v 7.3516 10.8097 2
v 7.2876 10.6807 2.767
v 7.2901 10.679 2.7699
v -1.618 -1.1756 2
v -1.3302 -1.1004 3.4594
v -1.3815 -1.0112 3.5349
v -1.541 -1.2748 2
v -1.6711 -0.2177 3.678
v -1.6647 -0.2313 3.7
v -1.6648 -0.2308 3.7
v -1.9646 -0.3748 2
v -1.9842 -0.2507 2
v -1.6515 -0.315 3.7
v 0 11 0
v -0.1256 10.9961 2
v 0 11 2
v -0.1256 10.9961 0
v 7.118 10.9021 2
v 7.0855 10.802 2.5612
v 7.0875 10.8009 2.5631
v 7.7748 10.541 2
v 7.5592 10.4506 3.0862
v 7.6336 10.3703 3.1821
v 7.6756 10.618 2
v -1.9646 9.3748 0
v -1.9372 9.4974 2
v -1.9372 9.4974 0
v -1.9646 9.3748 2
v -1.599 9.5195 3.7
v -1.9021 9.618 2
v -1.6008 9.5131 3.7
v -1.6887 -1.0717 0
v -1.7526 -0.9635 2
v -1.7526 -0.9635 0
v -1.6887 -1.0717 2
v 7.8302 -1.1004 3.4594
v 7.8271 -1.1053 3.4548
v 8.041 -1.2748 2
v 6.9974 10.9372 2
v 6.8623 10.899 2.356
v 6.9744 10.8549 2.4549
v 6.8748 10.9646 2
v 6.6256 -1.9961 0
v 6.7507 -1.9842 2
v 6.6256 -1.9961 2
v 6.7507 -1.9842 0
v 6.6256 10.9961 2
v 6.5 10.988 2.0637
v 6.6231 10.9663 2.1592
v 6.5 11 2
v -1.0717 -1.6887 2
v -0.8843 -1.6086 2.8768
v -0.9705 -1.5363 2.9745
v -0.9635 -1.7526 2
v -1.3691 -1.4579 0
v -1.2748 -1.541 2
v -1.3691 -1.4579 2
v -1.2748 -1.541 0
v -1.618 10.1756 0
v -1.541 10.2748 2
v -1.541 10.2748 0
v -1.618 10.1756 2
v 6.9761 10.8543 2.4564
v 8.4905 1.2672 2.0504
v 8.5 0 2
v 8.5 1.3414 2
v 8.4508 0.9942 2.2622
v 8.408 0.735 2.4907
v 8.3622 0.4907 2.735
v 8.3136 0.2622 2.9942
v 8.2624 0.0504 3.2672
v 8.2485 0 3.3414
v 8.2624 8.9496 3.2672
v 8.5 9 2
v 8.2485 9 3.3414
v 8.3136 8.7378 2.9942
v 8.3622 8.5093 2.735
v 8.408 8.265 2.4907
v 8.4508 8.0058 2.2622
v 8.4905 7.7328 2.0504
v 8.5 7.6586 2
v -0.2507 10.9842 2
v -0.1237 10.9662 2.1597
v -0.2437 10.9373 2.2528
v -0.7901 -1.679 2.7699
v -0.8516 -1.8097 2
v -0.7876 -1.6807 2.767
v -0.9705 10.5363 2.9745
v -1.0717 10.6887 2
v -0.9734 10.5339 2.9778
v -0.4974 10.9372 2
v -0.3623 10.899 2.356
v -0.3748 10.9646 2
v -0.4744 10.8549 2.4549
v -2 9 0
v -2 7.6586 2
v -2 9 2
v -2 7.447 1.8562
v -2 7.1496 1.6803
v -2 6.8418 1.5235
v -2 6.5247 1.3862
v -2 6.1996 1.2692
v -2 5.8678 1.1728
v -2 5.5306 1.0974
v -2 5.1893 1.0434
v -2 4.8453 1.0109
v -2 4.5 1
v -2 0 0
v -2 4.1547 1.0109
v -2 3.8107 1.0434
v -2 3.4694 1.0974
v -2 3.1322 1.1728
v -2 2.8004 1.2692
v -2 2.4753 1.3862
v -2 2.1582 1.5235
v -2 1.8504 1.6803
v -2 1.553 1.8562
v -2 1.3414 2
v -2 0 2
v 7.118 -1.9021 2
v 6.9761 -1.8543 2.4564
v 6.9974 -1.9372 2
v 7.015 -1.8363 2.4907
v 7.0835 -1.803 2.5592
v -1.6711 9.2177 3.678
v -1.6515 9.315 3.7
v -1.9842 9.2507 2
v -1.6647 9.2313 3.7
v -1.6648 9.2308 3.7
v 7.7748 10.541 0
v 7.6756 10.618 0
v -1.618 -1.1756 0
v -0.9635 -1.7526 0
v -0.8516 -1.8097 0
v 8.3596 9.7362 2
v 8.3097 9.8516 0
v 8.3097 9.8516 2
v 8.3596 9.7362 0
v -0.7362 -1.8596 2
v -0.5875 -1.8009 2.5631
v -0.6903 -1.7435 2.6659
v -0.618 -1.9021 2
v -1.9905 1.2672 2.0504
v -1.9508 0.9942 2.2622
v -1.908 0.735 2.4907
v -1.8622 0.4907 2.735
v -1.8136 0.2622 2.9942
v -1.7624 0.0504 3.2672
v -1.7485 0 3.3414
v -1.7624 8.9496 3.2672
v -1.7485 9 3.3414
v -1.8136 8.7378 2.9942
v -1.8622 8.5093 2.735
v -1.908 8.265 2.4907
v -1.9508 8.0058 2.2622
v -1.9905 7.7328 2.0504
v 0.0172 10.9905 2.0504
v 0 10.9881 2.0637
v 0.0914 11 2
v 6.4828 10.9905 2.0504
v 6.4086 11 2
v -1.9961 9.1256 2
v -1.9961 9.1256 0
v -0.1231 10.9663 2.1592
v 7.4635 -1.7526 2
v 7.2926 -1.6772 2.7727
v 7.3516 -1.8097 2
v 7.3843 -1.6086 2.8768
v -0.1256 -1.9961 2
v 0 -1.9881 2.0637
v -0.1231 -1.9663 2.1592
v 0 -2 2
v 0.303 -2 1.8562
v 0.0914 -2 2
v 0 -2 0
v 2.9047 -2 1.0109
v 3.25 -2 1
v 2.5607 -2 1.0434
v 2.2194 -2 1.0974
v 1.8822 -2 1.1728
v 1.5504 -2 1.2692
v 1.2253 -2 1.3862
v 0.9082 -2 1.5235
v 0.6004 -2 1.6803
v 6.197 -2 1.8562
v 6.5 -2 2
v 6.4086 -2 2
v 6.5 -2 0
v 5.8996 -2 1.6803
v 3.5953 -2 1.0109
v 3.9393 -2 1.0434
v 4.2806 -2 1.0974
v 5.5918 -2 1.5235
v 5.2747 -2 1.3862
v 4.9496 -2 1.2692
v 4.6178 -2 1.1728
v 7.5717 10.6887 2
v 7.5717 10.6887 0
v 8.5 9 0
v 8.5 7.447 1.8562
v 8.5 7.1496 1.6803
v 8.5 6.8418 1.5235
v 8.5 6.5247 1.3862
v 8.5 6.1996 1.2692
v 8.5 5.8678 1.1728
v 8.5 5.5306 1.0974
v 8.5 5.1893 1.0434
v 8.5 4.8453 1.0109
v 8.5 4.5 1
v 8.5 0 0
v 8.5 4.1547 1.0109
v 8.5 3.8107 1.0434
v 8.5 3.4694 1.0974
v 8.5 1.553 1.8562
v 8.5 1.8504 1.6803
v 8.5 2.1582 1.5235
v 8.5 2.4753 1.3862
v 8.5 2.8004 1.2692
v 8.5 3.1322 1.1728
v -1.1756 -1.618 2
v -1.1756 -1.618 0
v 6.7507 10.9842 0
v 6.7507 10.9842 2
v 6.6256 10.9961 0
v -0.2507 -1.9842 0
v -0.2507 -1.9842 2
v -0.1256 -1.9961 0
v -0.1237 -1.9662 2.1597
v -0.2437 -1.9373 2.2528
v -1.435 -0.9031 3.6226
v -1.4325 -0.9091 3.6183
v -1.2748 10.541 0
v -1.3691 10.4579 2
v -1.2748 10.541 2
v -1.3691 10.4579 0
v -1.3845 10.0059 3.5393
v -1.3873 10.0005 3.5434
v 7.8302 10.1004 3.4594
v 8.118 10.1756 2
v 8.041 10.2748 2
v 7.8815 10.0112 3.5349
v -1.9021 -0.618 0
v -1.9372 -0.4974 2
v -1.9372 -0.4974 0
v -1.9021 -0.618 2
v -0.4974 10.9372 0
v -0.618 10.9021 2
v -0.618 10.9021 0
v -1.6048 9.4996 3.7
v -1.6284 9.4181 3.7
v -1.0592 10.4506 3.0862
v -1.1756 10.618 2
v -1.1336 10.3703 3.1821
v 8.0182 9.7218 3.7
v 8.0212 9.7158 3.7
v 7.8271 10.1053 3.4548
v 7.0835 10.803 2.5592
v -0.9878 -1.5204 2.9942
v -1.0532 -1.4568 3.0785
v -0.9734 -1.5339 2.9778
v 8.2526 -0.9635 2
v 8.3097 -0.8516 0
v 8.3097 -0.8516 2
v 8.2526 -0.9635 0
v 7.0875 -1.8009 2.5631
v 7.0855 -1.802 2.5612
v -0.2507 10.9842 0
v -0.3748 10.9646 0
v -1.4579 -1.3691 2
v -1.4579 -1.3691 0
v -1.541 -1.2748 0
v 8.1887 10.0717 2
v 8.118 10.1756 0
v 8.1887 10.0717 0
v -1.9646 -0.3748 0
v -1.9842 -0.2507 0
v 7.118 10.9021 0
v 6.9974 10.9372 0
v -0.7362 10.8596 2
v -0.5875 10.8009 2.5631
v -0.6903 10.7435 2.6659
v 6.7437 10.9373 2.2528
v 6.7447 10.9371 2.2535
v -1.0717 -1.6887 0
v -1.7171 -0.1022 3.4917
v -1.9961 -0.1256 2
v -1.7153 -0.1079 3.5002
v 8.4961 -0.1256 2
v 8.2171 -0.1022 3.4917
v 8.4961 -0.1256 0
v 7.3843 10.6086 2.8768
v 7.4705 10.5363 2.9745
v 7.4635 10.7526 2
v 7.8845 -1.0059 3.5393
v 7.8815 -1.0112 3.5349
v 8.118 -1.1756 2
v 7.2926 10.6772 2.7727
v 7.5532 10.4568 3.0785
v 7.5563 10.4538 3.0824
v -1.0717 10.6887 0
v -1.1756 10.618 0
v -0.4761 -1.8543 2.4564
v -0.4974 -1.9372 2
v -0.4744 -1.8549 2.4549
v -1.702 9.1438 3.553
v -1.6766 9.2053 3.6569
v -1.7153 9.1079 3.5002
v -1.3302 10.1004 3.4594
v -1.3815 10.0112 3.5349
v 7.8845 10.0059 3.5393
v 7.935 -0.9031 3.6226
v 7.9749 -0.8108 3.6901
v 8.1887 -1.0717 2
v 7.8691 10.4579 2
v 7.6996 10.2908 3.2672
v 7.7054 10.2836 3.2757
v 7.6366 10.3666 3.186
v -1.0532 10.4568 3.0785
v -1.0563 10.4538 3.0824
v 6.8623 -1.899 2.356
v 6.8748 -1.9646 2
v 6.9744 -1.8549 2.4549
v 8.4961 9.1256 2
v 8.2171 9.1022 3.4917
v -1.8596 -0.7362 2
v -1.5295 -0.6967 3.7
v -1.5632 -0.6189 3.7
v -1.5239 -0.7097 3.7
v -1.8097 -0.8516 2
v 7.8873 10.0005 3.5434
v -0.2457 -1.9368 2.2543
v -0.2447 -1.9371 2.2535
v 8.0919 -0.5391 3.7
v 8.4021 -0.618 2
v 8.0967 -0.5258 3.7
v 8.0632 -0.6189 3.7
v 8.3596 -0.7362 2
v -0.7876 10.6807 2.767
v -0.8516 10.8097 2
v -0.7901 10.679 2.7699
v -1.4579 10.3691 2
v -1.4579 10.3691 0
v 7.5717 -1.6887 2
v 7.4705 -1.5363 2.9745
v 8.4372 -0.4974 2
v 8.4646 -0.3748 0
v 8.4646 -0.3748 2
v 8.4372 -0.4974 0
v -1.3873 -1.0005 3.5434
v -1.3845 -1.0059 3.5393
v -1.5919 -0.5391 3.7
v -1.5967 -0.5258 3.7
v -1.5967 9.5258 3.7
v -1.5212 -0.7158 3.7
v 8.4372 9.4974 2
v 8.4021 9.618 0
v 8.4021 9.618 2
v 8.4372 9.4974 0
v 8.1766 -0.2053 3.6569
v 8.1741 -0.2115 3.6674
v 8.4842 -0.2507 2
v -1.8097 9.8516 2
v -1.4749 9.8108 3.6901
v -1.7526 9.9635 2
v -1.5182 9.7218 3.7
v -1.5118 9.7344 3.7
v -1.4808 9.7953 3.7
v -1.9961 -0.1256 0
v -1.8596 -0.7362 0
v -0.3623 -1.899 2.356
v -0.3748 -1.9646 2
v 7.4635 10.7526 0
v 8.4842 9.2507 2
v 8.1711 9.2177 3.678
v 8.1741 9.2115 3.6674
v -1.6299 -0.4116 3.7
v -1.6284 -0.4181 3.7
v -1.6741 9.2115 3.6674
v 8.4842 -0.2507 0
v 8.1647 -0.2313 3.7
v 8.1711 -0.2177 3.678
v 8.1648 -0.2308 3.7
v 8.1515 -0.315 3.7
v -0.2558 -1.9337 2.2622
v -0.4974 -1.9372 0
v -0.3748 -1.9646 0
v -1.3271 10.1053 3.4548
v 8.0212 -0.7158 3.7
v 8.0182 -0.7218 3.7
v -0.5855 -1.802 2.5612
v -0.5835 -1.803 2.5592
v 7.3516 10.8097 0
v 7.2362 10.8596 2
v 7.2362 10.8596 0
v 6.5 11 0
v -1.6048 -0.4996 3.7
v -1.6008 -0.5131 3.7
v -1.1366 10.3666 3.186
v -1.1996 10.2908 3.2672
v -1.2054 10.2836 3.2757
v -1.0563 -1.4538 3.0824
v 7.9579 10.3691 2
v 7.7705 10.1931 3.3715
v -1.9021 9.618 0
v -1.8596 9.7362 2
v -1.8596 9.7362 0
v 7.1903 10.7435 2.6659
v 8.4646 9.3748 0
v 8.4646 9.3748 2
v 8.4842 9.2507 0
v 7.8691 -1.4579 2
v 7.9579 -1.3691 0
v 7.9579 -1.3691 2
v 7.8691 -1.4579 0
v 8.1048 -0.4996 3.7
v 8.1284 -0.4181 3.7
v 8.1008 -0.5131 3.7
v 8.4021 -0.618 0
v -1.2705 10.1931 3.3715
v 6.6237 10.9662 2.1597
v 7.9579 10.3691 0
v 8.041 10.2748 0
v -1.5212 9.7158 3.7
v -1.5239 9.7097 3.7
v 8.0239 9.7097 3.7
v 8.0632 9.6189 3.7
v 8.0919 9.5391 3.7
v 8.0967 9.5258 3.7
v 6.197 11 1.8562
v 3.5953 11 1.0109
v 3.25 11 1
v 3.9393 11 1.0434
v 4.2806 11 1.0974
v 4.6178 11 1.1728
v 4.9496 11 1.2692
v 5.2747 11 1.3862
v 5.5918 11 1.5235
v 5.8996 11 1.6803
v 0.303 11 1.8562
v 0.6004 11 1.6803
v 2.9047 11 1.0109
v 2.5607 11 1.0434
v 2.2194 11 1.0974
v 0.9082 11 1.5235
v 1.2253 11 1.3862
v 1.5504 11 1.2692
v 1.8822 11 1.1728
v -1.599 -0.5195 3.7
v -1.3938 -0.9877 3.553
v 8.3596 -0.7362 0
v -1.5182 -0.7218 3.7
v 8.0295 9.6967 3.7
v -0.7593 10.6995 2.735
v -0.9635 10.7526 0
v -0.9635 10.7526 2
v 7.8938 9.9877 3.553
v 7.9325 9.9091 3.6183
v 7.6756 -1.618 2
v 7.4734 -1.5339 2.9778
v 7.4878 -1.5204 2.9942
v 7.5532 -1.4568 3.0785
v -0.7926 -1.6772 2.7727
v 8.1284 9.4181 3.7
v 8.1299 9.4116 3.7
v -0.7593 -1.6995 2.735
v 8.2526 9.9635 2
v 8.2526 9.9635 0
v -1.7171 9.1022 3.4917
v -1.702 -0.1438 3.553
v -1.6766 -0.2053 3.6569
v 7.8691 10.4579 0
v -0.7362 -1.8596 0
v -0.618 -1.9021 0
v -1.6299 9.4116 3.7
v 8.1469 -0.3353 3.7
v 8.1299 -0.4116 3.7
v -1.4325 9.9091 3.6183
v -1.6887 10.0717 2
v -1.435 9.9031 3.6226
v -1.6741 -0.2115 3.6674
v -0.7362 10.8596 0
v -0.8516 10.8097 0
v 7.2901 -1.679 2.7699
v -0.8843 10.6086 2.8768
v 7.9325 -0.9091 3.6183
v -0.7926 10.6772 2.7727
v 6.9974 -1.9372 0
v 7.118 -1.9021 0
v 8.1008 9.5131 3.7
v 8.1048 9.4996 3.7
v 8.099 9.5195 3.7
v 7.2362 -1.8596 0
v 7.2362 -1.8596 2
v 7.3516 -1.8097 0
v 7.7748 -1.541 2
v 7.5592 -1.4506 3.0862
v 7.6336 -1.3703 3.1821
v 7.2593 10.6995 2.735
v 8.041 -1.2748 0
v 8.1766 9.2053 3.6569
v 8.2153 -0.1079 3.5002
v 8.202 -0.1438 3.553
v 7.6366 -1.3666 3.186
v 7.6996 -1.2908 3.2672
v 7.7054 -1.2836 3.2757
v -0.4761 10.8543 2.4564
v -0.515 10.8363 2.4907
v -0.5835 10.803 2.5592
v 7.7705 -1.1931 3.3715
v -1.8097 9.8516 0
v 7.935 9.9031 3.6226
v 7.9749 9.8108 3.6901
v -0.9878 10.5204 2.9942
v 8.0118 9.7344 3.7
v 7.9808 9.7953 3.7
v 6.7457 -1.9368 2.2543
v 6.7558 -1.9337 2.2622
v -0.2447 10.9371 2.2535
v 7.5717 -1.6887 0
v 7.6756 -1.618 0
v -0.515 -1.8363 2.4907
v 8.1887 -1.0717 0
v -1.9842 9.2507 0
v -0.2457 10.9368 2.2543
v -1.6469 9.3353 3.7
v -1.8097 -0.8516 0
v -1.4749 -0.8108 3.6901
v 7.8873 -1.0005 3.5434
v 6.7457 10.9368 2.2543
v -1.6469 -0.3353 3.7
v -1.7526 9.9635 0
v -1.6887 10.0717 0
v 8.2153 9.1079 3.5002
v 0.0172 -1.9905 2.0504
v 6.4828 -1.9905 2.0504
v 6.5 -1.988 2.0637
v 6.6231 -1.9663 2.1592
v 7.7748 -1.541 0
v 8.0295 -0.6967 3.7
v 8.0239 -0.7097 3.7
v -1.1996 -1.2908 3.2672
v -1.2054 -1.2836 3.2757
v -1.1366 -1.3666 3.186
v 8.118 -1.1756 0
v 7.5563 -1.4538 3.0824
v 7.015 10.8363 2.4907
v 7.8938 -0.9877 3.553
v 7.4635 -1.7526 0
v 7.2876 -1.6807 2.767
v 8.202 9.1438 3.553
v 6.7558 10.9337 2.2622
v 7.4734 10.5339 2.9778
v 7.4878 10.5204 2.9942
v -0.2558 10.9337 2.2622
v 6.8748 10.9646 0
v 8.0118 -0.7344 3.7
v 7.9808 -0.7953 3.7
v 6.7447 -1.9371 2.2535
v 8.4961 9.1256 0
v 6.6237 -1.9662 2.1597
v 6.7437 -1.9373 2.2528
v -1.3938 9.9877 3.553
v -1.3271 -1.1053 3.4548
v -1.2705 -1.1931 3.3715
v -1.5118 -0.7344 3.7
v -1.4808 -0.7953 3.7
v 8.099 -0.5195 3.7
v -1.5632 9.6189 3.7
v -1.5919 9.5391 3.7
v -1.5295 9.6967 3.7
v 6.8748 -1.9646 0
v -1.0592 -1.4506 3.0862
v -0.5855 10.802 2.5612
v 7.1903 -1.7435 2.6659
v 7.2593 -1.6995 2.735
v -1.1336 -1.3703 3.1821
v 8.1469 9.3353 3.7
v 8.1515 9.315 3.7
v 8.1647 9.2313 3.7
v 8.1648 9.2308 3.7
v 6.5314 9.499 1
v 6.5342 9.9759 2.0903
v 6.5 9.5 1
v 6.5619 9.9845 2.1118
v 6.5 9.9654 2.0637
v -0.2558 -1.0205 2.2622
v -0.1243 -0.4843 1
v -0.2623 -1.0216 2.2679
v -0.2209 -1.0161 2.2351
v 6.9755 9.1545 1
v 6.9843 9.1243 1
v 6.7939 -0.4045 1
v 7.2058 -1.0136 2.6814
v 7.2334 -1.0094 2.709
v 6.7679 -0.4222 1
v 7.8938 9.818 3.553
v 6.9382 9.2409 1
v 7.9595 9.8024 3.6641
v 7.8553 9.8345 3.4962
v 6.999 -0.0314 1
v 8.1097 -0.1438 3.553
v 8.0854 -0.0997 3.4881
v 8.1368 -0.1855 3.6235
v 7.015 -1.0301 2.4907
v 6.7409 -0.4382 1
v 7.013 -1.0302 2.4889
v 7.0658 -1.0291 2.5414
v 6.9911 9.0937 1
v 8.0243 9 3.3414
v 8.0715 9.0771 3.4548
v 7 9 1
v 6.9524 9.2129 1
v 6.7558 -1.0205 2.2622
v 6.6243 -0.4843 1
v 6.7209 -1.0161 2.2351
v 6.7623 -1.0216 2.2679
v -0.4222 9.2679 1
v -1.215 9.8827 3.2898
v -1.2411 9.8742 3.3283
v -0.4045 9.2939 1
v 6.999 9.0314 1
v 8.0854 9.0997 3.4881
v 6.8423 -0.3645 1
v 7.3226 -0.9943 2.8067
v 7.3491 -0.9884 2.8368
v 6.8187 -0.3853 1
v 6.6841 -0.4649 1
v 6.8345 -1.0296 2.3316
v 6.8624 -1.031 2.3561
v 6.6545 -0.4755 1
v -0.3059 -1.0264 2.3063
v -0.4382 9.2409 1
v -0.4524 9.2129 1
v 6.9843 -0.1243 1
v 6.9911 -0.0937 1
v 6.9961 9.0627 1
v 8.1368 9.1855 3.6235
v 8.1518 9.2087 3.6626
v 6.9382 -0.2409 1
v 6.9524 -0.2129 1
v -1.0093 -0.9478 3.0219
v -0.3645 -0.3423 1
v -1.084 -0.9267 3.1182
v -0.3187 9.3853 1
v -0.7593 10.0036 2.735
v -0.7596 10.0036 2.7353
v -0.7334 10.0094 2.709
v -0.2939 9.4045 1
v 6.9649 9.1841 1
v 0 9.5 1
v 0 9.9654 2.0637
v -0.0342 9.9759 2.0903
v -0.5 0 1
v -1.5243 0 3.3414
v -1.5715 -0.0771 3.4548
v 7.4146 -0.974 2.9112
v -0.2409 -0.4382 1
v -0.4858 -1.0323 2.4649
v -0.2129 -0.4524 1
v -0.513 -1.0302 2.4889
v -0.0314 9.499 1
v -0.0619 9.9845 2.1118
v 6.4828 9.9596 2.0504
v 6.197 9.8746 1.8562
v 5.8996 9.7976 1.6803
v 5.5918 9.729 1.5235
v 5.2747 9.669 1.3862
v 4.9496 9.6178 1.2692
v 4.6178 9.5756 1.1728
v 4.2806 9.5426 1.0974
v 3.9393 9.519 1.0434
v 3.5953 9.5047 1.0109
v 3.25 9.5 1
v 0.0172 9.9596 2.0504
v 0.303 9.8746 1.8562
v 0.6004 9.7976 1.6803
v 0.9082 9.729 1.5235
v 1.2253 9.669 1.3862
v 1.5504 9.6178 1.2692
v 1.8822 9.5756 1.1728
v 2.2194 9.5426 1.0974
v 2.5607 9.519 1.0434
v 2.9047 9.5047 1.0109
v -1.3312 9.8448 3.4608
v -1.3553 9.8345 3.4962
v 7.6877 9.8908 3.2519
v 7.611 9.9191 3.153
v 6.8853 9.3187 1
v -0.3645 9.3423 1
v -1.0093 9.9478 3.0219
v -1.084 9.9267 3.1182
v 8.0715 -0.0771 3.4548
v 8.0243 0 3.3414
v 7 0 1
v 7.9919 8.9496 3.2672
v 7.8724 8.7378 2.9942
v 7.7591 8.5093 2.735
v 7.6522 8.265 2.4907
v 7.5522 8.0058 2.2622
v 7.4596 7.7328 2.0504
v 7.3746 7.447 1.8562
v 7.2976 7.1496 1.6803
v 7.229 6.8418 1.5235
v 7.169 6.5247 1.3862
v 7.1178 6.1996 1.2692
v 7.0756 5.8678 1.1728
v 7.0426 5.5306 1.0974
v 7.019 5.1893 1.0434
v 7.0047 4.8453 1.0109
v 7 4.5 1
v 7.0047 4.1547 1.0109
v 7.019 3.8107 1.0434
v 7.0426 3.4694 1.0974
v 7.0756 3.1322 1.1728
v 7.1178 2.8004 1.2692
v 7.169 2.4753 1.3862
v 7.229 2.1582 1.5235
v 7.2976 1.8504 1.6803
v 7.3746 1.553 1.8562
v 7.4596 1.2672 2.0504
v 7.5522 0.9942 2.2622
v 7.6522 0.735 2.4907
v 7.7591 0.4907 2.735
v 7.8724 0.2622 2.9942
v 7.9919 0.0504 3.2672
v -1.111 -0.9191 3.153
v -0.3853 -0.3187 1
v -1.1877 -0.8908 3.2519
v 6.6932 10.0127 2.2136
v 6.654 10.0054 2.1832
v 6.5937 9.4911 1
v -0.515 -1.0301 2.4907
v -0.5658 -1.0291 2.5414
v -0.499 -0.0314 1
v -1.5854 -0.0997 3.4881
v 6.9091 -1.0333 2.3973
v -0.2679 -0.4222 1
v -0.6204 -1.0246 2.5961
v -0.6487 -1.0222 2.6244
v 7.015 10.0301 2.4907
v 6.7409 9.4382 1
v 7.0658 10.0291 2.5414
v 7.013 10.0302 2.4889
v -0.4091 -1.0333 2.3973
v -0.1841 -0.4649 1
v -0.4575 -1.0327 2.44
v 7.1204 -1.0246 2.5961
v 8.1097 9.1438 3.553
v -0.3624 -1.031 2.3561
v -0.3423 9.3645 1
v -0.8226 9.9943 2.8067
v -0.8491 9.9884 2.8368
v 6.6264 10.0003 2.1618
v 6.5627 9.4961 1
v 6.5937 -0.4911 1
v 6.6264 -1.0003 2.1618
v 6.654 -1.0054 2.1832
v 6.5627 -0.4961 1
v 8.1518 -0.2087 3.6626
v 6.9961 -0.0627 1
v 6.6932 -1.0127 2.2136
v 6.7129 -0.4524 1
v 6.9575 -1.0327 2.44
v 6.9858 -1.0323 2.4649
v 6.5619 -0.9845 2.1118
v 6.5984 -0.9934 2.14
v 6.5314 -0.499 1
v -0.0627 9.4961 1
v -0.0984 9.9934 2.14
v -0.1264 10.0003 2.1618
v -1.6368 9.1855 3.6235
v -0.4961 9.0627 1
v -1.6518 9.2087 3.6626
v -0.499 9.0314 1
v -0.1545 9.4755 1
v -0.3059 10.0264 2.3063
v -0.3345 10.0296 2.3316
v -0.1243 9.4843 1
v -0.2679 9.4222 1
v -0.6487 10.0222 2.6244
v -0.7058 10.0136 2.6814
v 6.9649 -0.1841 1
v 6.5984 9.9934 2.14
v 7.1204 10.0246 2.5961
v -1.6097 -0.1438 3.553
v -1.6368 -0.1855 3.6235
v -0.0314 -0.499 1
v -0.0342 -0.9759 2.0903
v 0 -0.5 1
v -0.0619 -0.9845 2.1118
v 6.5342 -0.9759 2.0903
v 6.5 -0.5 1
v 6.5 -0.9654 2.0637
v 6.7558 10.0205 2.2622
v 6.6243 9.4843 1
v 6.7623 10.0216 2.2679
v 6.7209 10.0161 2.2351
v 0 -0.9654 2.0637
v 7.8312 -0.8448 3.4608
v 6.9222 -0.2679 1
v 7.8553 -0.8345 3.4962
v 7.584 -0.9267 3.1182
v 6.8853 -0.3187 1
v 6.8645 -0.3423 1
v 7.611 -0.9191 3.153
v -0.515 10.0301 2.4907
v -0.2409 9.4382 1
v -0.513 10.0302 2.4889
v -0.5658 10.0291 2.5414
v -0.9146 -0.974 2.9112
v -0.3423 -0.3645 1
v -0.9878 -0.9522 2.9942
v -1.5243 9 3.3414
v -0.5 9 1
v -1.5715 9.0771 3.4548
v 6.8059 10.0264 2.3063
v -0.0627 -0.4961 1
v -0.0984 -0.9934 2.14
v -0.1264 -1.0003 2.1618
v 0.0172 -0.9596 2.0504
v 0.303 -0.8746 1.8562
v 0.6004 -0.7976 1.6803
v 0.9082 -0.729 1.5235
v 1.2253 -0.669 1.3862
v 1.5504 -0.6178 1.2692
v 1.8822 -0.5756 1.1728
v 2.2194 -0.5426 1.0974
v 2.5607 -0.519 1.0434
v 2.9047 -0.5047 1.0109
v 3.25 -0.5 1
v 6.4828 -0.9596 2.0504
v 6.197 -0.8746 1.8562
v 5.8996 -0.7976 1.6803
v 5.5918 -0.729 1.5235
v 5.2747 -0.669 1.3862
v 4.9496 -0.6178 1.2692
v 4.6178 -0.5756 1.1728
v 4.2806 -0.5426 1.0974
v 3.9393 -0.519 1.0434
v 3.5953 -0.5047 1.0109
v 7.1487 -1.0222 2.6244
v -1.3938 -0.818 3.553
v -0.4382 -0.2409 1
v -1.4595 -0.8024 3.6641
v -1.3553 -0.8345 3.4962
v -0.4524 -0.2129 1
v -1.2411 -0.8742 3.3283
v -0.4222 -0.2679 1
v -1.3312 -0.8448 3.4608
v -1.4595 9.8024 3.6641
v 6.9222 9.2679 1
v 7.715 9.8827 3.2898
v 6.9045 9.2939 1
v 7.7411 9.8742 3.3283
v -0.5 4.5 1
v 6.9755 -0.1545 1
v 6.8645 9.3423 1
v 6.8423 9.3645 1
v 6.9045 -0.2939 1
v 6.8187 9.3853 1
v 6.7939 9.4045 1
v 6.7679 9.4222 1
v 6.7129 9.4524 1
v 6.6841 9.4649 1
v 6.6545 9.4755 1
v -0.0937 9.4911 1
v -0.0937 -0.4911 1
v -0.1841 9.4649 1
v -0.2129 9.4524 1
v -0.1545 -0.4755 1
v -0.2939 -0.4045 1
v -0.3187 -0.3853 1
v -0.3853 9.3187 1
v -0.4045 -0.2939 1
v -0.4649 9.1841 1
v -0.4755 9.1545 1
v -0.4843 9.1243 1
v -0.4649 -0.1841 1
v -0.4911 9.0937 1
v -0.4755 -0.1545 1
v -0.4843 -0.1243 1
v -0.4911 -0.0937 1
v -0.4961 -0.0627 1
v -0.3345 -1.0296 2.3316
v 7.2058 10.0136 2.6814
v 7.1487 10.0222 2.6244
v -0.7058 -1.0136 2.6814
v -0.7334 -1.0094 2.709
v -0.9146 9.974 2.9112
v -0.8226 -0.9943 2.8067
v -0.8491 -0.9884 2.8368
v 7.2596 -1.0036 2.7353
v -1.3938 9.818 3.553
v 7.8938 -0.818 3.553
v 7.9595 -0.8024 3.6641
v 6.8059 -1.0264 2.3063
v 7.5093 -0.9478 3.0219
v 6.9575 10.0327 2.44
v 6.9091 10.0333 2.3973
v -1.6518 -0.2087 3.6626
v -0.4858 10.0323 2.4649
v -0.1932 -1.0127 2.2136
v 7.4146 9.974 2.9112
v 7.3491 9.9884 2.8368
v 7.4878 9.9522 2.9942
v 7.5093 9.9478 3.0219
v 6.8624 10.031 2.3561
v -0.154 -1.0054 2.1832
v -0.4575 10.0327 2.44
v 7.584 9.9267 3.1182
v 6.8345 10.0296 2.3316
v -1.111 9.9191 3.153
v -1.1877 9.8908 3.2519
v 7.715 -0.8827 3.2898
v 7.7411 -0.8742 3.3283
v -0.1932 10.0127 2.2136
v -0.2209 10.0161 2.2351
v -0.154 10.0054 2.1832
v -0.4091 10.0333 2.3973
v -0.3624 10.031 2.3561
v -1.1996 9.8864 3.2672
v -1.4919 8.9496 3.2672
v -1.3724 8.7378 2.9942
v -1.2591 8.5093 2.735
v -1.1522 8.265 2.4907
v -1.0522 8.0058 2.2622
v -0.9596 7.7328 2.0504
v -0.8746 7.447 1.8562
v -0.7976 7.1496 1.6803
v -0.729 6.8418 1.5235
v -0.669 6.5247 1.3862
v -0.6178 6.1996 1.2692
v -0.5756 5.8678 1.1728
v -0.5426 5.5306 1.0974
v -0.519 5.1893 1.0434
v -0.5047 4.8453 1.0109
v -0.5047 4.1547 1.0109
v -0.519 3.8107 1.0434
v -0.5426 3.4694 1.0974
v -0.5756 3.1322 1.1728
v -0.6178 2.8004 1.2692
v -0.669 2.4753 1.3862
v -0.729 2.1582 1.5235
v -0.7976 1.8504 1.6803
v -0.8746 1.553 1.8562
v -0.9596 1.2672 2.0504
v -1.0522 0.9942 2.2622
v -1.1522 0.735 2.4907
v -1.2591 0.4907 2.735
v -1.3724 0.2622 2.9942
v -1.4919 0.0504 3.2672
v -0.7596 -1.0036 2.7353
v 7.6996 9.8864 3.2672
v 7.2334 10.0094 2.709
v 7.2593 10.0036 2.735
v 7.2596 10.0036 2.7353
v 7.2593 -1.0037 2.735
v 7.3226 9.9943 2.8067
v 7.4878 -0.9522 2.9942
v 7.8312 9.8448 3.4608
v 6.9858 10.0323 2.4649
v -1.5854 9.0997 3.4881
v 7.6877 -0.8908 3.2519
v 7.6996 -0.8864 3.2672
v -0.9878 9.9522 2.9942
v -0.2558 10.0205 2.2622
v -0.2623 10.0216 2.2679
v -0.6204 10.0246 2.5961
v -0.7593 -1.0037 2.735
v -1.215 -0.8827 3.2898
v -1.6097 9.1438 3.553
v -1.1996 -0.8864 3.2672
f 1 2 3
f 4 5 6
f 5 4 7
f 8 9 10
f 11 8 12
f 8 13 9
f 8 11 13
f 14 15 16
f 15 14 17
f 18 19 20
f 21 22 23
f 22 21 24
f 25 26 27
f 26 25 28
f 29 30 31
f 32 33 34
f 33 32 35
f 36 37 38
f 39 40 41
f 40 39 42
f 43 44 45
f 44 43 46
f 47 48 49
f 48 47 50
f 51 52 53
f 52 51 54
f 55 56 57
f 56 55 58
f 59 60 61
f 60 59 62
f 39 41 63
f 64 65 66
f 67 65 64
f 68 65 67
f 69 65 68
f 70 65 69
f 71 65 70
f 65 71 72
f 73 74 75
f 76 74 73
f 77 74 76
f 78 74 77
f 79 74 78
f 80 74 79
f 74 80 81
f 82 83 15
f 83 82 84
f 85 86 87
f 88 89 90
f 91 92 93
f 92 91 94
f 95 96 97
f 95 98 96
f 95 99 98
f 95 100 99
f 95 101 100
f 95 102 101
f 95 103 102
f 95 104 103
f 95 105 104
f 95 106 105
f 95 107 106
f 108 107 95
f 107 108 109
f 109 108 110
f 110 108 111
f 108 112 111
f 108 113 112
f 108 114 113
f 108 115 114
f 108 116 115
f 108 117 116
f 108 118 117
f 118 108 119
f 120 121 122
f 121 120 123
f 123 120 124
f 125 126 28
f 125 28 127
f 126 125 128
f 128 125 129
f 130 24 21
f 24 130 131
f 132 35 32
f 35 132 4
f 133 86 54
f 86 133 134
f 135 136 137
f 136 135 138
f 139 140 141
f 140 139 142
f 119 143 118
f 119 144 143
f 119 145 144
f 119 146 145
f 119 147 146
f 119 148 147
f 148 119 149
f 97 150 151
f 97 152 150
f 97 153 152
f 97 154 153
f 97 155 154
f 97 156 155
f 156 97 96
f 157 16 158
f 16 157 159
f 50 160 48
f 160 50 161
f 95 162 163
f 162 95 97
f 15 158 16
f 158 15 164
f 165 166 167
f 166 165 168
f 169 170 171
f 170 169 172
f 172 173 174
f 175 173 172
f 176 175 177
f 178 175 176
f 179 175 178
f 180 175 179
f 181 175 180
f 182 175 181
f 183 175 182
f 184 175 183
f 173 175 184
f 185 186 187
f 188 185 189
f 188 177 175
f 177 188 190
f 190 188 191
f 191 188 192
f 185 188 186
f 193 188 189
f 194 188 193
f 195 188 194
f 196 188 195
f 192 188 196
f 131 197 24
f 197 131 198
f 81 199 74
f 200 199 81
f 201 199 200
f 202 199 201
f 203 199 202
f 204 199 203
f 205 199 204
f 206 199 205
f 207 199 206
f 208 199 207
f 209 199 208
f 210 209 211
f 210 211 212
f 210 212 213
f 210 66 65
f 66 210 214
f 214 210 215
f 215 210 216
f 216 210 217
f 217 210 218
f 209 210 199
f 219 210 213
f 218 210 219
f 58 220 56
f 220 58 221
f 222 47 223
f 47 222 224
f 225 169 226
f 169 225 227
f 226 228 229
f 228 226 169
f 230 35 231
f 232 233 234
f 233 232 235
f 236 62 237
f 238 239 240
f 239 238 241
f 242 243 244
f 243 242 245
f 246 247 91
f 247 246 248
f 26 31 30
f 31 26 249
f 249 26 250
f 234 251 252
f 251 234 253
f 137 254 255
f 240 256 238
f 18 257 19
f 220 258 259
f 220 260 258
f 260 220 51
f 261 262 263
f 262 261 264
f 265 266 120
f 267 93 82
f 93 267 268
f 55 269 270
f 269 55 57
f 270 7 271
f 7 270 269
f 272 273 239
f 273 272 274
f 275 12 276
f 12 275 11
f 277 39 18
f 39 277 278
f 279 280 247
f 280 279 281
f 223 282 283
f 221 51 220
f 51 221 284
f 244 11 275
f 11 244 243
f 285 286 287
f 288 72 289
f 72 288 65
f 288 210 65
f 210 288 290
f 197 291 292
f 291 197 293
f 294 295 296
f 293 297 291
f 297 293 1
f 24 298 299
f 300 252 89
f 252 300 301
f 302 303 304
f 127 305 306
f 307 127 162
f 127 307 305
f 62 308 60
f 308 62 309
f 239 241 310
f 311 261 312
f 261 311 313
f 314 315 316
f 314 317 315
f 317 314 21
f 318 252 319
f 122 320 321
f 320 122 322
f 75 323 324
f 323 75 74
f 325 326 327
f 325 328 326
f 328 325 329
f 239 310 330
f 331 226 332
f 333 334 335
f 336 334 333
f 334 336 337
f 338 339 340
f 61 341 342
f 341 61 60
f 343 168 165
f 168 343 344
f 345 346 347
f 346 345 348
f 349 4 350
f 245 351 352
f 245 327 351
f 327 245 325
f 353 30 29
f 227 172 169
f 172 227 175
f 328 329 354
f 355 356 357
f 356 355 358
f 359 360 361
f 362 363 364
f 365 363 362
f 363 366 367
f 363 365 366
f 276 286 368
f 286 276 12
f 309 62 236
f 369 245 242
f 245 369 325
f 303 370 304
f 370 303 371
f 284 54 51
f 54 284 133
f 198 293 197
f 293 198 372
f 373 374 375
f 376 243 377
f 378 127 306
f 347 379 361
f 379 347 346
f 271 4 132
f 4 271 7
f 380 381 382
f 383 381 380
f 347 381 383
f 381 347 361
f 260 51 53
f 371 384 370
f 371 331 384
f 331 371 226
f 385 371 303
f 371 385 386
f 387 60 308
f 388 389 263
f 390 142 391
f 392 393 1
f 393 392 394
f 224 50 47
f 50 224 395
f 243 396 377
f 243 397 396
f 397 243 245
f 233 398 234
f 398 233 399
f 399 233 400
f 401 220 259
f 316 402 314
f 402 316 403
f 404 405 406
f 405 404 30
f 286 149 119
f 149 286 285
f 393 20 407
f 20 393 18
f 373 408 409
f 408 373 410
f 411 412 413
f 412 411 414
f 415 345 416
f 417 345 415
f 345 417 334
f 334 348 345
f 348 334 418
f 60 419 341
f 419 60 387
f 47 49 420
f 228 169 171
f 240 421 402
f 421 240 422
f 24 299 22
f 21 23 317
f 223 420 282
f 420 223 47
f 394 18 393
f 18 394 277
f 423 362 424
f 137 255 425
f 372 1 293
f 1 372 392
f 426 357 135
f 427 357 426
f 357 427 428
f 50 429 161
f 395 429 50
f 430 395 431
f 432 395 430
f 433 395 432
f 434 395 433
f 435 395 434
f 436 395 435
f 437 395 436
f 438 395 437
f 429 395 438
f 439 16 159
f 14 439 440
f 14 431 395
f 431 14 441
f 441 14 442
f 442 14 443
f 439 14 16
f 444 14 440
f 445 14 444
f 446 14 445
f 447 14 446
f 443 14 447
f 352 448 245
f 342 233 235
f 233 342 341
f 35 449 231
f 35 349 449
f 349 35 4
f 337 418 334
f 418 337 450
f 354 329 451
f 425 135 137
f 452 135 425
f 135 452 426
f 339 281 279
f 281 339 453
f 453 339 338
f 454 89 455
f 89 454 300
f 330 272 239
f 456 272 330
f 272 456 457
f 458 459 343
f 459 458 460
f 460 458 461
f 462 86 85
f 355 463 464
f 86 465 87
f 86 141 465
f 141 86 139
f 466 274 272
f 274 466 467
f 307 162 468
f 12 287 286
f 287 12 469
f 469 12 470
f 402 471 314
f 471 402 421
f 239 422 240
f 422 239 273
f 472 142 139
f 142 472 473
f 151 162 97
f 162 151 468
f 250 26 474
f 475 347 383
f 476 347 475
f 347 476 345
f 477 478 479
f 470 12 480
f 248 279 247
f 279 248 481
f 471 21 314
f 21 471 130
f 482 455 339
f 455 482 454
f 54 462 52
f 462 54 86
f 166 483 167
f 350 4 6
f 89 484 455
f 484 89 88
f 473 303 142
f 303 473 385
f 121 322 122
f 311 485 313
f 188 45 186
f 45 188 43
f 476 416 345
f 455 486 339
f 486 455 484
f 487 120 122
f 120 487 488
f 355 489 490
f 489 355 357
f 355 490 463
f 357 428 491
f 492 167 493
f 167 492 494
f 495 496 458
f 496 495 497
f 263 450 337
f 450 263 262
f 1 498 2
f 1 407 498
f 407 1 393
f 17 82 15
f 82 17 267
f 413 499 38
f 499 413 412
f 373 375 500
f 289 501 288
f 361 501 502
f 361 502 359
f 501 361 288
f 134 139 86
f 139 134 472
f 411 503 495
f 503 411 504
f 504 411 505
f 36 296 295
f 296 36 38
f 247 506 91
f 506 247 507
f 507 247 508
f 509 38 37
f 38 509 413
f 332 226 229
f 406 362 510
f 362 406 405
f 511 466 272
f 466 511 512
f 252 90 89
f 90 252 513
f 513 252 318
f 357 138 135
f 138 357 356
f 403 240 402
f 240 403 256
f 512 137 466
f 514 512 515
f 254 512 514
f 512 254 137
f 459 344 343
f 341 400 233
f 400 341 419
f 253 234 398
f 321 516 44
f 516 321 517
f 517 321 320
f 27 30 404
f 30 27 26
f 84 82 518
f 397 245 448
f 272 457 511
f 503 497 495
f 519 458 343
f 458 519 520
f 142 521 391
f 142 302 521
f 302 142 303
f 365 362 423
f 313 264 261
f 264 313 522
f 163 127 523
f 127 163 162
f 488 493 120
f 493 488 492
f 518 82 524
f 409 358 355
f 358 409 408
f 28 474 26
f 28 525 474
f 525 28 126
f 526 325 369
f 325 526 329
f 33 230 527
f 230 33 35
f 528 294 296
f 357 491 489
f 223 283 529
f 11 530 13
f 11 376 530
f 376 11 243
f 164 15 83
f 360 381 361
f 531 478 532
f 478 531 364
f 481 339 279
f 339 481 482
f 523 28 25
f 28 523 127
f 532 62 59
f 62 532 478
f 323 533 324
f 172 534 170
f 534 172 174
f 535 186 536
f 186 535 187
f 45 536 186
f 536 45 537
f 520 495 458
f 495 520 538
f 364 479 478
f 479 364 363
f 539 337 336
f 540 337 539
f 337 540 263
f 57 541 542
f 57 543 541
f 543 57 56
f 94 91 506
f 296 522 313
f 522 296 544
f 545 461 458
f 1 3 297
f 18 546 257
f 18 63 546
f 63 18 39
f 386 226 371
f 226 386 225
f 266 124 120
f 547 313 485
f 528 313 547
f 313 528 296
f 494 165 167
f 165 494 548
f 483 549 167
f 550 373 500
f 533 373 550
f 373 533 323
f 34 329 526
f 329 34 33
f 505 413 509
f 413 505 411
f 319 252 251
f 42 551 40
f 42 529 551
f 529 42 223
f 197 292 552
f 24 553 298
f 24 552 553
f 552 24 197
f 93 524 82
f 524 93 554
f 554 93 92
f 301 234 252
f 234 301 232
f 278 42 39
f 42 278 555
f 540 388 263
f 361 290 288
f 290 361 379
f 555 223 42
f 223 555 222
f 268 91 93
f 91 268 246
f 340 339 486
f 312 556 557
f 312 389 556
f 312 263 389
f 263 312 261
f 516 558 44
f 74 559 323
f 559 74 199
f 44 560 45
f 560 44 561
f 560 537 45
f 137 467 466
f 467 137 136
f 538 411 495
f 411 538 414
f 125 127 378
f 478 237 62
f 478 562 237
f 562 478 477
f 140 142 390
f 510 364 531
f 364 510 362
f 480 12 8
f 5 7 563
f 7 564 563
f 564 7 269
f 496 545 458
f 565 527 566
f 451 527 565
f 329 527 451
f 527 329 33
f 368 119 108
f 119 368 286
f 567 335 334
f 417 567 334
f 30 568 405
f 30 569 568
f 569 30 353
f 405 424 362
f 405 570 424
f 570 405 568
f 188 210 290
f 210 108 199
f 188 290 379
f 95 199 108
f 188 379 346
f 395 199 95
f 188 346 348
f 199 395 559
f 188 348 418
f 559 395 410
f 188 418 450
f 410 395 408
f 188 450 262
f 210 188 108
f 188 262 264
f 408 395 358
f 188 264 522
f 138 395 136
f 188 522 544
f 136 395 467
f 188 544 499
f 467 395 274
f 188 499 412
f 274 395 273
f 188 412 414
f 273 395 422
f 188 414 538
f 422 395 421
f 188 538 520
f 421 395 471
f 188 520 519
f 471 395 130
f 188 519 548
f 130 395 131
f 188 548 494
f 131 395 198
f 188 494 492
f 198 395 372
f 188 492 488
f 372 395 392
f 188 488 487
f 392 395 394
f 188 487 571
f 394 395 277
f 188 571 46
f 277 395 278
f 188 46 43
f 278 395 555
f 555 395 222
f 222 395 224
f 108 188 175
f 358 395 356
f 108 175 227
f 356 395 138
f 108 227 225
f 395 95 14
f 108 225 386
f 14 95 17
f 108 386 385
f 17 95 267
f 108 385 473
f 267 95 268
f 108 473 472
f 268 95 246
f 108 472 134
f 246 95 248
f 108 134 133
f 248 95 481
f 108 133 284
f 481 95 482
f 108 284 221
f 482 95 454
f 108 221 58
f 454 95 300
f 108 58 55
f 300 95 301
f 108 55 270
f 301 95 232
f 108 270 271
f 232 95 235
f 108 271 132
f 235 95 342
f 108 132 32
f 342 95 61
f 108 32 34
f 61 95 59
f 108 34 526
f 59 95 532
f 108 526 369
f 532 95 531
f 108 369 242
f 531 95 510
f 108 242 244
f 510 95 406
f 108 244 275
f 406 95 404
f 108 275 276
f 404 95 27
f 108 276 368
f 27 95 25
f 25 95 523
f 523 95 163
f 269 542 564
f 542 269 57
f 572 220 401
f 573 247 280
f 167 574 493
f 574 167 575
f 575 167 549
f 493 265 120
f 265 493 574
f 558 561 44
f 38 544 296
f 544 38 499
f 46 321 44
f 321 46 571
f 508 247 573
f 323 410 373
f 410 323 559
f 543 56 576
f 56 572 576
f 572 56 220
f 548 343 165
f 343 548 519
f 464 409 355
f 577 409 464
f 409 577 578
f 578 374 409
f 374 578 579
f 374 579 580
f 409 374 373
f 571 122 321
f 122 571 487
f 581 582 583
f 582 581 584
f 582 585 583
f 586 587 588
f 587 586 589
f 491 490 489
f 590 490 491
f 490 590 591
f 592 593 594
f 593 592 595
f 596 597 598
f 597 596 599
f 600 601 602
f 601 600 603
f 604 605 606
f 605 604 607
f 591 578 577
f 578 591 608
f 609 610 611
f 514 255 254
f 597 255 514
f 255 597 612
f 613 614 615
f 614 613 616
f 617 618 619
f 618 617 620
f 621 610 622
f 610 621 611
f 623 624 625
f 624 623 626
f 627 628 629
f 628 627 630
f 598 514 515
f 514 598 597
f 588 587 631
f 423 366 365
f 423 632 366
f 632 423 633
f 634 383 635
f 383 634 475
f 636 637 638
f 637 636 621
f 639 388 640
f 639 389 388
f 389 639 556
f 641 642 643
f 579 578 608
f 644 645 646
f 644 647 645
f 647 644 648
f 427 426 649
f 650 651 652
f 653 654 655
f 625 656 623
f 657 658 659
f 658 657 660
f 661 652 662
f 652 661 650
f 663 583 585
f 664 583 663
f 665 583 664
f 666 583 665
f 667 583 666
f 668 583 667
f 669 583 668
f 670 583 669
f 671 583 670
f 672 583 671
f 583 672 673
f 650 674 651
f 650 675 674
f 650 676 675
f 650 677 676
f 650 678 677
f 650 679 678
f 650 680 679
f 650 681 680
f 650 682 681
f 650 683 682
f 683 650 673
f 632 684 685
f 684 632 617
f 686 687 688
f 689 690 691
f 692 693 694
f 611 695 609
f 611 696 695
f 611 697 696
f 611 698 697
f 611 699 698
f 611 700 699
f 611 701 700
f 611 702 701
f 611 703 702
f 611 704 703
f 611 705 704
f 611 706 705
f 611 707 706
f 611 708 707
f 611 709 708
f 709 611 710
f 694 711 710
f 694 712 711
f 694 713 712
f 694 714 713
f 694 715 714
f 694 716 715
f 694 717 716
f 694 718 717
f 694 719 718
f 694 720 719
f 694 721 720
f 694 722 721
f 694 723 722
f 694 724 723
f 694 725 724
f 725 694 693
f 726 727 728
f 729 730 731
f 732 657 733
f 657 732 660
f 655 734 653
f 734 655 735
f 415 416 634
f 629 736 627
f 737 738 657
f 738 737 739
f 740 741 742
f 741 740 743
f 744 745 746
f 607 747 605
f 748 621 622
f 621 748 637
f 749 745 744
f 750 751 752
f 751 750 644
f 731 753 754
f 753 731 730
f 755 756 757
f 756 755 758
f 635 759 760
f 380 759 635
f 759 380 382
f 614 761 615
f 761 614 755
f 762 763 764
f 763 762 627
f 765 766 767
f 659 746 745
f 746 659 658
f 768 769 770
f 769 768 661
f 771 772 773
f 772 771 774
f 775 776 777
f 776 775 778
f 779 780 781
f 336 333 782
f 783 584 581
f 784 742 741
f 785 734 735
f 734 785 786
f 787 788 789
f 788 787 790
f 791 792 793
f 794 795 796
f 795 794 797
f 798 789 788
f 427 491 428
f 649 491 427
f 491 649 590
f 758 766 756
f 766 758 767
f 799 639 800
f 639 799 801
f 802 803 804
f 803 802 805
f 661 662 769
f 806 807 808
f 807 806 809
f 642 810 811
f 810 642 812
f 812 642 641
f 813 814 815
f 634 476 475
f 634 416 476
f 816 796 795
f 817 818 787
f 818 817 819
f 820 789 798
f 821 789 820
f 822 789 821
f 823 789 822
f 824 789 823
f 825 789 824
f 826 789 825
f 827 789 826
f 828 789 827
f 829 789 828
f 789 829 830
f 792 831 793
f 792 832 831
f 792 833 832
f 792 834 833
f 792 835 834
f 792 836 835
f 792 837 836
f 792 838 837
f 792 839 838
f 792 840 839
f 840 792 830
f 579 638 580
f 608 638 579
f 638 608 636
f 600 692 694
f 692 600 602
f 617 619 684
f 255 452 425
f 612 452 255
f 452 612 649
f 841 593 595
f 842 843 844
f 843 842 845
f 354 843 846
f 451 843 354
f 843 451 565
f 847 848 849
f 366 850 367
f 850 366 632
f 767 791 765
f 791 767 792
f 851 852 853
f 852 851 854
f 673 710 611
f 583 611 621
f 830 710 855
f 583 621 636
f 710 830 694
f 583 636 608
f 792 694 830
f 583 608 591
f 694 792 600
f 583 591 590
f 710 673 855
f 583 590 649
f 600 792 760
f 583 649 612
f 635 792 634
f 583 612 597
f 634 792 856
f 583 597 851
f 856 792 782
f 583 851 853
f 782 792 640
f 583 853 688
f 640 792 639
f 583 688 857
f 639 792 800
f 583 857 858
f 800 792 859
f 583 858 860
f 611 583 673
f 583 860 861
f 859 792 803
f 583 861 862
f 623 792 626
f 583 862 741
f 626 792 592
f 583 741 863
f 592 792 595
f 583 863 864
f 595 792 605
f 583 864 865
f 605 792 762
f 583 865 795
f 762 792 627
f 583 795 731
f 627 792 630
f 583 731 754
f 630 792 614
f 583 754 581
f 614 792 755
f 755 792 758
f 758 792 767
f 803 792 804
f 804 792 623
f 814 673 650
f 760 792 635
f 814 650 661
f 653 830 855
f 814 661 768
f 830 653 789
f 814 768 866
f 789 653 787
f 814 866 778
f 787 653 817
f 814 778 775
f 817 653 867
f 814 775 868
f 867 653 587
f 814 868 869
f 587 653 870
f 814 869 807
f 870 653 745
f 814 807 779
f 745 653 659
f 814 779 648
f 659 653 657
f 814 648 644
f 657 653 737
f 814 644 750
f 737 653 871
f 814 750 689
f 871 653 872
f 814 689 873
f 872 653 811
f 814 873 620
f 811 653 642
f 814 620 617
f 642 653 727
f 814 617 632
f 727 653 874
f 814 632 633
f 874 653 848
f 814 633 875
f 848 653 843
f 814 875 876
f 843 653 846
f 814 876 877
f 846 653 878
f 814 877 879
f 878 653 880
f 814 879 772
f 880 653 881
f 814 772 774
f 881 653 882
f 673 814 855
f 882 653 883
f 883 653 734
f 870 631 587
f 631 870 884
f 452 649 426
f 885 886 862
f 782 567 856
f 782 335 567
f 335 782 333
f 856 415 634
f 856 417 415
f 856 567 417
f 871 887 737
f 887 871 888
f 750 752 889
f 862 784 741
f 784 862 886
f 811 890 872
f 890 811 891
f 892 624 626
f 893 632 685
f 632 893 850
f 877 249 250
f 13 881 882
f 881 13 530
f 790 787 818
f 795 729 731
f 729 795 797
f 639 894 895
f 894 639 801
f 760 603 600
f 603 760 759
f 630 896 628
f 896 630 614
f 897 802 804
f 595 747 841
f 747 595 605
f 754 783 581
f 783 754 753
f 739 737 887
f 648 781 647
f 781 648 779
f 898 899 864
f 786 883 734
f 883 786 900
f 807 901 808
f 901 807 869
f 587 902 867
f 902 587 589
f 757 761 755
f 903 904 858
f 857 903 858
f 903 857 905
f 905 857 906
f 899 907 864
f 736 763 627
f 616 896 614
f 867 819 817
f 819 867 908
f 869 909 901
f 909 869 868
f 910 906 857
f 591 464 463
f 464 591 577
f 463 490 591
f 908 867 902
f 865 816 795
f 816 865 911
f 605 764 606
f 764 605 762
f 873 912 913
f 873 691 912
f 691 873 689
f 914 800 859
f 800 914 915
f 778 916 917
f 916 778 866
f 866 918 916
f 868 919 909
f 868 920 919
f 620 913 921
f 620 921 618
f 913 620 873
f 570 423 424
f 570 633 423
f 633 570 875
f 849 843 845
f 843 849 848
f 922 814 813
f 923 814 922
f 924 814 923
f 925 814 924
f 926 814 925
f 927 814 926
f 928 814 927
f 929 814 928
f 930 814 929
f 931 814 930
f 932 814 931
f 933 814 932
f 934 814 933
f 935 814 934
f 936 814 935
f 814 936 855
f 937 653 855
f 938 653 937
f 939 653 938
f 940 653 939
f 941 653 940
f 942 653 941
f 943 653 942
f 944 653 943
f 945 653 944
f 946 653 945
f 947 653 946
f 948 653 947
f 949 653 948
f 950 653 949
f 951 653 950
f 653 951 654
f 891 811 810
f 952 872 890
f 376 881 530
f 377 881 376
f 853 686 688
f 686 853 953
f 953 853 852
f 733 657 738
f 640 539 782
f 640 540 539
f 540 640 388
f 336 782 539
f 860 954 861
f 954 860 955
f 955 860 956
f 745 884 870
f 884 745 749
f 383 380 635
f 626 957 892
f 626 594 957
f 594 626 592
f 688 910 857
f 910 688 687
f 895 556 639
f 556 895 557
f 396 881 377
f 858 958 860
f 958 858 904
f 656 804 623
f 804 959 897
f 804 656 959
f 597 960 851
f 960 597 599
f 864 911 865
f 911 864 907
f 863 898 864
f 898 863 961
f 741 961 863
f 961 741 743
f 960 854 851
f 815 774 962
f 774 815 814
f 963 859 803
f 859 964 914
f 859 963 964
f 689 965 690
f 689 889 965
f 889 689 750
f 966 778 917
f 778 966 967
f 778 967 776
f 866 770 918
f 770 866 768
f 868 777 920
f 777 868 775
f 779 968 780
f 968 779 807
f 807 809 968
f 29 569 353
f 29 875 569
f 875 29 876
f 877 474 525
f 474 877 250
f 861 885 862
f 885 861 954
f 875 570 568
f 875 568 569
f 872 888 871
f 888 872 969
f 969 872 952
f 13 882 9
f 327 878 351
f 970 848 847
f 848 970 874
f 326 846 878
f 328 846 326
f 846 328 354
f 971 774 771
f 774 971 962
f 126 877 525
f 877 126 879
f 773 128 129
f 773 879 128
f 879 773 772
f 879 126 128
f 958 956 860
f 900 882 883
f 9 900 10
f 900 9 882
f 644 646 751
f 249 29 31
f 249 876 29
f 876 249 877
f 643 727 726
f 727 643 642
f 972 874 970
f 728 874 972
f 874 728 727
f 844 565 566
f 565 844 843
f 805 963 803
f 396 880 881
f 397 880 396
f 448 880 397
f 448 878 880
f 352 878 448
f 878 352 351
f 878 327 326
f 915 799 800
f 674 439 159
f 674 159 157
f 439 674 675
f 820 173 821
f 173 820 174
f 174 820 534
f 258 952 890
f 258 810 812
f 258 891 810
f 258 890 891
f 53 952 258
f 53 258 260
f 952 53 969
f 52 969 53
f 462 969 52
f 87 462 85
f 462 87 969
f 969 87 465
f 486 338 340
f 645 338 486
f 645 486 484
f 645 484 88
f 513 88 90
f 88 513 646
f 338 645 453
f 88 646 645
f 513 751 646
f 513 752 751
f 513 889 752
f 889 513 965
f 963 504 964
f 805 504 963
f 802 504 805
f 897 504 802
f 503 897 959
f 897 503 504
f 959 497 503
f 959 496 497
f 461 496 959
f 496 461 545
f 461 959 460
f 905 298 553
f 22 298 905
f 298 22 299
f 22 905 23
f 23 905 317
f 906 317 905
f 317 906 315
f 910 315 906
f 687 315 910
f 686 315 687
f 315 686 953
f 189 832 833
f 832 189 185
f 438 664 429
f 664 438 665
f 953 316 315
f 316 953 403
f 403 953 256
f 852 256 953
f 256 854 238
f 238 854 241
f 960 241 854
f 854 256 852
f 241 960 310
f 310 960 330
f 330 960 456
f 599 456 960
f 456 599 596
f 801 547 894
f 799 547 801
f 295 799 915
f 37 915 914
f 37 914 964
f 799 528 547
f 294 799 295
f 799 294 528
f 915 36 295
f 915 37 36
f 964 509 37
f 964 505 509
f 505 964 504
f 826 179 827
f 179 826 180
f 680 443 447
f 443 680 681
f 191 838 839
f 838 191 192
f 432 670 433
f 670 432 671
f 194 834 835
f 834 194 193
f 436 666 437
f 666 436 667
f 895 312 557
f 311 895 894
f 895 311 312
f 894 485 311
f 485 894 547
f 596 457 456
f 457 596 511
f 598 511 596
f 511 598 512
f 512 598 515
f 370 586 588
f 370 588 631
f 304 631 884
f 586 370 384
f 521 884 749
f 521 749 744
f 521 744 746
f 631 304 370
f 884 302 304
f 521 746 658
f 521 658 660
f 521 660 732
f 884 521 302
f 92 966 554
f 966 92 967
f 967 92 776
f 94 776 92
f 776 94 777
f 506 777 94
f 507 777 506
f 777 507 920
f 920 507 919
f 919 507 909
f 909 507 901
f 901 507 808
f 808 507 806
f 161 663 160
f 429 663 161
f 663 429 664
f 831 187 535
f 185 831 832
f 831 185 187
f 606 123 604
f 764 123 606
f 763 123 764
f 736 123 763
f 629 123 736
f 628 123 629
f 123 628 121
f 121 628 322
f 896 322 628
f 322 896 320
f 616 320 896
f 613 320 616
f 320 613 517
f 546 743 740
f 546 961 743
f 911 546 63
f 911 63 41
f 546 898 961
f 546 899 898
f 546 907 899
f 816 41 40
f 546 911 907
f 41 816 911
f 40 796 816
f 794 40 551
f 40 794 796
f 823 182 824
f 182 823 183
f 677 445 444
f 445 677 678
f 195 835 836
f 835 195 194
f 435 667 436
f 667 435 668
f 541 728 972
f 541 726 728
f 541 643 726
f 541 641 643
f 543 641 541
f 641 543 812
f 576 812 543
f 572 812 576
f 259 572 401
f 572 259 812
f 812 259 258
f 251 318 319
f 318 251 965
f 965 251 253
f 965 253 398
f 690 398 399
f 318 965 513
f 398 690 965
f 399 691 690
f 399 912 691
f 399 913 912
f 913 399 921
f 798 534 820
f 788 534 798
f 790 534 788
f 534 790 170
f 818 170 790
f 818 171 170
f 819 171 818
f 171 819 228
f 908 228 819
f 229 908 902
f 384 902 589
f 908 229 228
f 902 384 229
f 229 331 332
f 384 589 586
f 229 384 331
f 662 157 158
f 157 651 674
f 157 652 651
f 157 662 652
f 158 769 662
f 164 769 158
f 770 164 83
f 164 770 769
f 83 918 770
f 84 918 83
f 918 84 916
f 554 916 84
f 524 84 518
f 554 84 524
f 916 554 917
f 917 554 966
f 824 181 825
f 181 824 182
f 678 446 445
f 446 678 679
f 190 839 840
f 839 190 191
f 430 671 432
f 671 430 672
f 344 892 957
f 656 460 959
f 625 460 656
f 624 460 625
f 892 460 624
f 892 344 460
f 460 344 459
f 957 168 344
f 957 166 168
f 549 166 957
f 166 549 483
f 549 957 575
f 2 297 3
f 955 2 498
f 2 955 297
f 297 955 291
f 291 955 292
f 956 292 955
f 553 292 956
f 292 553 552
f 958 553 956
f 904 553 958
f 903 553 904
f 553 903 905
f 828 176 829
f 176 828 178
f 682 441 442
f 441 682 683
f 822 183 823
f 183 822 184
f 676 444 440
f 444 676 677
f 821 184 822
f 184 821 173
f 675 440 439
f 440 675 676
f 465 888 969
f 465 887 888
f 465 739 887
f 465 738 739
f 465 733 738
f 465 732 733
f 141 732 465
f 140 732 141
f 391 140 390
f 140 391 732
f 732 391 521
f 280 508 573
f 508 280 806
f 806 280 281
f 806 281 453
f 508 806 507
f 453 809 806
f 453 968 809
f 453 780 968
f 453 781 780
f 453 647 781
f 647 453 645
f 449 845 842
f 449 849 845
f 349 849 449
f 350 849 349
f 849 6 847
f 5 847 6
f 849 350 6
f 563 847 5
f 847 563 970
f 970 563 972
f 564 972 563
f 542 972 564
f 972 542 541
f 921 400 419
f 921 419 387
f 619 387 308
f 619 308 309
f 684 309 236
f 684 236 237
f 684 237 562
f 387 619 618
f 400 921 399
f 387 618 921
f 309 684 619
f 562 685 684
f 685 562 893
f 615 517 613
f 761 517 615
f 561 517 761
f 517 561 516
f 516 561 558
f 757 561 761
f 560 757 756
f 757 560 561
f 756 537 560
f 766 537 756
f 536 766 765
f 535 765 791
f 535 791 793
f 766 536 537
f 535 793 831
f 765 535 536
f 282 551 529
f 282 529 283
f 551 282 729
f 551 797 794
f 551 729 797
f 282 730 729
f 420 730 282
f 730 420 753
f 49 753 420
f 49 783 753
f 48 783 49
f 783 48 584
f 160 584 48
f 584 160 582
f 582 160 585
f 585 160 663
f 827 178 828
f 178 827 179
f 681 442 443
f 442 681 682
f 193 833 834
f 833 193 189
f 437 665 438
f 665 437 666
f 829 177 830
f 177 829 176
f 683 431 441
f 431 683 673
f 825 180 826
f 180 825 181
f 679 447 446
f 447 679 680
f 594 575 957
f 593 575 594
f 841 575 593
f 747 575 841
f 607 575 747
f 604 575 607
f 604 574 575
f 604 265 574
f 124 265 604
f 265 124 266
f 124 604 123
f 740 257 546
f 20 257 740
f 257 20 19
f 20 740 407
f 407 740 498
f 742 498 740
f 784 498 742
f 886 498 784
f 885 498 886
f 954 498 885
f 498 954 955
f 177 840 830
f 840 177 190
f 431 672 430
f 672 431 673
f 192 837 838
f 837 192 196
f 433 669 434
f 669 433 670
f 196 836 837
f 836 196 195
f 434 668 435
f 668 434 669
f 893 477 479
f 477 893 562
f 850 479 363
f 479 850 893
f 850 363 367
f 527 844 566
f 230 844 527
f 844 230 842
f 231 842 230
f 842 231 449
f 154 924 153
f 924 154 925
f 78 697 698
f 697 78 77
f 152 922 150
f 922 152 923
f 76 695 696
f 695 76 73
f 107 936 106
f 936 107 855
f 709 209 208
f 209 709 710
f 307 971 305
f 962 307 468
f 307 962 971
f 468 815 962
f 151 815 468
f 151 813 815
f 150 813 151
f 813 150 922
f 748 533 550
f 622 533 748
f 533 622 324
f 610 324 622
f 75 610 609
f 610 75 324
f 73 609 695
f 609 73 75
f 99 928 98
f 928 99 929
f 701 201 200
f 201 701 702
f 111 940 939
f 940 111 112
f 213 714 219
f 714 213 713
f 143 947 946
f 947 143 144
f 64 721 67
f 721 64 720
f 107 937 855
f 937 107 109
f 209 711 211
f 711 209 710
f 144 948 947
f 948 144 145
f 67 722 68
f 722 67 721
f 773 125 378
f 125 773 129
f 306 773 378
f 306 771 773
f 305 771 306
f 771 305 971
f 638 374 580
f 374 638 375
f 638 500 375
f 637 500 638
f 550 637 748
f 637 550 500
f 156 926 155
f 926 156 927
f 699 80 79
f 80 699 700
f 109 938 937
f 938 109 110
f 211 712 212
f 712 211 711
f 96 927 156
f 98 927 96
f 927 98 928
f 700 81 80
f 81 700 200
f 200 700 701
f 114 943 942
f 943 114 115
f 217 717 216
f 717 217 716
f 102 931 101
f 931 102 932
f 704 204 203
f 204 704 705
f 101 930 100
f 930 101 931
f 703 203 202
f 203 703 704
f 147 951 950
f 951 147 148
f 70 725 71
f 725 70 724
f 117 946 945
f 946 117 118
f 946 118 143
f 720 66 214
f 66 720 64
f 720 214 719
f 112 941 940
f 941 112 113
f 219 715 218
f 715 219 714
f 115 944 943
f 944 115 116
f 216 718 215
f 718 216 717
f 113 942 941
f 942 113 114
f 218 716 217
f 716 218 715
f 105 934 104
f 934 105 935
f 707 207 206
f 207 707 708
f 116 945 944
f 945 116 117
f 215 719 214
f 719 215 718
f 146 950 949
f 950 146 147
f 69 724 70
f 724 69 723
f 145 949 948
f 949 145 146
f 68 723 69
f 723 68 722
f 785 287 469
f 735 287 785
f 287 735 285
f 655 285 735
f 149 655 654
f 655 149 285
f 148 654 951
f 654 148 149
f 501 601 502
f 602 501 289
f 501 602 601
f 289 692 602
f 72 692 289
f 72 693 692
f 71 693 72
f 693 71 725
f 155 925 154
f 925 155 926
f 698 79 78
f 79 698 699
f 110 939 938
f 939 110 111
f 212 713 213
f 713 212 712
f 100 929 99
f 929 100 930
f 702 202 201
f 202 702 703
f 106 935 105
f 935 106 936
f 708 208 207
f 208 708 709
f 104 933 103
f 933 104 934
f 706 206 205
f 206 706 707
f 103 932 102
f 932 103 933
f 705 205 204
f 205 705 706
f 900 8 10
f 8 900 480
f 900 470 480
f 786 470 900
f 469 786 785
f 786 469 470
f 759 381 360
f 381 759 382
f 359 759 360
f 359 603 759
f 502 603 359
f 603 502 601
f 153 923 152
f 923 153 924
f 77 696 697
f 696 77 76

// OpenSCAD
$fn=100;
difference(){
difference(){
difference(){
minkowski(){
cube([6.5,9,2]);
cylinder(8,d1=4,d2=1);
}
translate([0,0,1]){

minkowski(){
cube([6.5,9,2]);
cylinder(8,d1=1,d2=8);
}
}
}

translate([3.25,-4,6.5]){
rotate([270,0,0]){
cylinder(32,d=11);
}}

}

translate([10,4.5,6.5]){
rotate([270,0,90]){
cylinder(32,d=11);
}}

}
